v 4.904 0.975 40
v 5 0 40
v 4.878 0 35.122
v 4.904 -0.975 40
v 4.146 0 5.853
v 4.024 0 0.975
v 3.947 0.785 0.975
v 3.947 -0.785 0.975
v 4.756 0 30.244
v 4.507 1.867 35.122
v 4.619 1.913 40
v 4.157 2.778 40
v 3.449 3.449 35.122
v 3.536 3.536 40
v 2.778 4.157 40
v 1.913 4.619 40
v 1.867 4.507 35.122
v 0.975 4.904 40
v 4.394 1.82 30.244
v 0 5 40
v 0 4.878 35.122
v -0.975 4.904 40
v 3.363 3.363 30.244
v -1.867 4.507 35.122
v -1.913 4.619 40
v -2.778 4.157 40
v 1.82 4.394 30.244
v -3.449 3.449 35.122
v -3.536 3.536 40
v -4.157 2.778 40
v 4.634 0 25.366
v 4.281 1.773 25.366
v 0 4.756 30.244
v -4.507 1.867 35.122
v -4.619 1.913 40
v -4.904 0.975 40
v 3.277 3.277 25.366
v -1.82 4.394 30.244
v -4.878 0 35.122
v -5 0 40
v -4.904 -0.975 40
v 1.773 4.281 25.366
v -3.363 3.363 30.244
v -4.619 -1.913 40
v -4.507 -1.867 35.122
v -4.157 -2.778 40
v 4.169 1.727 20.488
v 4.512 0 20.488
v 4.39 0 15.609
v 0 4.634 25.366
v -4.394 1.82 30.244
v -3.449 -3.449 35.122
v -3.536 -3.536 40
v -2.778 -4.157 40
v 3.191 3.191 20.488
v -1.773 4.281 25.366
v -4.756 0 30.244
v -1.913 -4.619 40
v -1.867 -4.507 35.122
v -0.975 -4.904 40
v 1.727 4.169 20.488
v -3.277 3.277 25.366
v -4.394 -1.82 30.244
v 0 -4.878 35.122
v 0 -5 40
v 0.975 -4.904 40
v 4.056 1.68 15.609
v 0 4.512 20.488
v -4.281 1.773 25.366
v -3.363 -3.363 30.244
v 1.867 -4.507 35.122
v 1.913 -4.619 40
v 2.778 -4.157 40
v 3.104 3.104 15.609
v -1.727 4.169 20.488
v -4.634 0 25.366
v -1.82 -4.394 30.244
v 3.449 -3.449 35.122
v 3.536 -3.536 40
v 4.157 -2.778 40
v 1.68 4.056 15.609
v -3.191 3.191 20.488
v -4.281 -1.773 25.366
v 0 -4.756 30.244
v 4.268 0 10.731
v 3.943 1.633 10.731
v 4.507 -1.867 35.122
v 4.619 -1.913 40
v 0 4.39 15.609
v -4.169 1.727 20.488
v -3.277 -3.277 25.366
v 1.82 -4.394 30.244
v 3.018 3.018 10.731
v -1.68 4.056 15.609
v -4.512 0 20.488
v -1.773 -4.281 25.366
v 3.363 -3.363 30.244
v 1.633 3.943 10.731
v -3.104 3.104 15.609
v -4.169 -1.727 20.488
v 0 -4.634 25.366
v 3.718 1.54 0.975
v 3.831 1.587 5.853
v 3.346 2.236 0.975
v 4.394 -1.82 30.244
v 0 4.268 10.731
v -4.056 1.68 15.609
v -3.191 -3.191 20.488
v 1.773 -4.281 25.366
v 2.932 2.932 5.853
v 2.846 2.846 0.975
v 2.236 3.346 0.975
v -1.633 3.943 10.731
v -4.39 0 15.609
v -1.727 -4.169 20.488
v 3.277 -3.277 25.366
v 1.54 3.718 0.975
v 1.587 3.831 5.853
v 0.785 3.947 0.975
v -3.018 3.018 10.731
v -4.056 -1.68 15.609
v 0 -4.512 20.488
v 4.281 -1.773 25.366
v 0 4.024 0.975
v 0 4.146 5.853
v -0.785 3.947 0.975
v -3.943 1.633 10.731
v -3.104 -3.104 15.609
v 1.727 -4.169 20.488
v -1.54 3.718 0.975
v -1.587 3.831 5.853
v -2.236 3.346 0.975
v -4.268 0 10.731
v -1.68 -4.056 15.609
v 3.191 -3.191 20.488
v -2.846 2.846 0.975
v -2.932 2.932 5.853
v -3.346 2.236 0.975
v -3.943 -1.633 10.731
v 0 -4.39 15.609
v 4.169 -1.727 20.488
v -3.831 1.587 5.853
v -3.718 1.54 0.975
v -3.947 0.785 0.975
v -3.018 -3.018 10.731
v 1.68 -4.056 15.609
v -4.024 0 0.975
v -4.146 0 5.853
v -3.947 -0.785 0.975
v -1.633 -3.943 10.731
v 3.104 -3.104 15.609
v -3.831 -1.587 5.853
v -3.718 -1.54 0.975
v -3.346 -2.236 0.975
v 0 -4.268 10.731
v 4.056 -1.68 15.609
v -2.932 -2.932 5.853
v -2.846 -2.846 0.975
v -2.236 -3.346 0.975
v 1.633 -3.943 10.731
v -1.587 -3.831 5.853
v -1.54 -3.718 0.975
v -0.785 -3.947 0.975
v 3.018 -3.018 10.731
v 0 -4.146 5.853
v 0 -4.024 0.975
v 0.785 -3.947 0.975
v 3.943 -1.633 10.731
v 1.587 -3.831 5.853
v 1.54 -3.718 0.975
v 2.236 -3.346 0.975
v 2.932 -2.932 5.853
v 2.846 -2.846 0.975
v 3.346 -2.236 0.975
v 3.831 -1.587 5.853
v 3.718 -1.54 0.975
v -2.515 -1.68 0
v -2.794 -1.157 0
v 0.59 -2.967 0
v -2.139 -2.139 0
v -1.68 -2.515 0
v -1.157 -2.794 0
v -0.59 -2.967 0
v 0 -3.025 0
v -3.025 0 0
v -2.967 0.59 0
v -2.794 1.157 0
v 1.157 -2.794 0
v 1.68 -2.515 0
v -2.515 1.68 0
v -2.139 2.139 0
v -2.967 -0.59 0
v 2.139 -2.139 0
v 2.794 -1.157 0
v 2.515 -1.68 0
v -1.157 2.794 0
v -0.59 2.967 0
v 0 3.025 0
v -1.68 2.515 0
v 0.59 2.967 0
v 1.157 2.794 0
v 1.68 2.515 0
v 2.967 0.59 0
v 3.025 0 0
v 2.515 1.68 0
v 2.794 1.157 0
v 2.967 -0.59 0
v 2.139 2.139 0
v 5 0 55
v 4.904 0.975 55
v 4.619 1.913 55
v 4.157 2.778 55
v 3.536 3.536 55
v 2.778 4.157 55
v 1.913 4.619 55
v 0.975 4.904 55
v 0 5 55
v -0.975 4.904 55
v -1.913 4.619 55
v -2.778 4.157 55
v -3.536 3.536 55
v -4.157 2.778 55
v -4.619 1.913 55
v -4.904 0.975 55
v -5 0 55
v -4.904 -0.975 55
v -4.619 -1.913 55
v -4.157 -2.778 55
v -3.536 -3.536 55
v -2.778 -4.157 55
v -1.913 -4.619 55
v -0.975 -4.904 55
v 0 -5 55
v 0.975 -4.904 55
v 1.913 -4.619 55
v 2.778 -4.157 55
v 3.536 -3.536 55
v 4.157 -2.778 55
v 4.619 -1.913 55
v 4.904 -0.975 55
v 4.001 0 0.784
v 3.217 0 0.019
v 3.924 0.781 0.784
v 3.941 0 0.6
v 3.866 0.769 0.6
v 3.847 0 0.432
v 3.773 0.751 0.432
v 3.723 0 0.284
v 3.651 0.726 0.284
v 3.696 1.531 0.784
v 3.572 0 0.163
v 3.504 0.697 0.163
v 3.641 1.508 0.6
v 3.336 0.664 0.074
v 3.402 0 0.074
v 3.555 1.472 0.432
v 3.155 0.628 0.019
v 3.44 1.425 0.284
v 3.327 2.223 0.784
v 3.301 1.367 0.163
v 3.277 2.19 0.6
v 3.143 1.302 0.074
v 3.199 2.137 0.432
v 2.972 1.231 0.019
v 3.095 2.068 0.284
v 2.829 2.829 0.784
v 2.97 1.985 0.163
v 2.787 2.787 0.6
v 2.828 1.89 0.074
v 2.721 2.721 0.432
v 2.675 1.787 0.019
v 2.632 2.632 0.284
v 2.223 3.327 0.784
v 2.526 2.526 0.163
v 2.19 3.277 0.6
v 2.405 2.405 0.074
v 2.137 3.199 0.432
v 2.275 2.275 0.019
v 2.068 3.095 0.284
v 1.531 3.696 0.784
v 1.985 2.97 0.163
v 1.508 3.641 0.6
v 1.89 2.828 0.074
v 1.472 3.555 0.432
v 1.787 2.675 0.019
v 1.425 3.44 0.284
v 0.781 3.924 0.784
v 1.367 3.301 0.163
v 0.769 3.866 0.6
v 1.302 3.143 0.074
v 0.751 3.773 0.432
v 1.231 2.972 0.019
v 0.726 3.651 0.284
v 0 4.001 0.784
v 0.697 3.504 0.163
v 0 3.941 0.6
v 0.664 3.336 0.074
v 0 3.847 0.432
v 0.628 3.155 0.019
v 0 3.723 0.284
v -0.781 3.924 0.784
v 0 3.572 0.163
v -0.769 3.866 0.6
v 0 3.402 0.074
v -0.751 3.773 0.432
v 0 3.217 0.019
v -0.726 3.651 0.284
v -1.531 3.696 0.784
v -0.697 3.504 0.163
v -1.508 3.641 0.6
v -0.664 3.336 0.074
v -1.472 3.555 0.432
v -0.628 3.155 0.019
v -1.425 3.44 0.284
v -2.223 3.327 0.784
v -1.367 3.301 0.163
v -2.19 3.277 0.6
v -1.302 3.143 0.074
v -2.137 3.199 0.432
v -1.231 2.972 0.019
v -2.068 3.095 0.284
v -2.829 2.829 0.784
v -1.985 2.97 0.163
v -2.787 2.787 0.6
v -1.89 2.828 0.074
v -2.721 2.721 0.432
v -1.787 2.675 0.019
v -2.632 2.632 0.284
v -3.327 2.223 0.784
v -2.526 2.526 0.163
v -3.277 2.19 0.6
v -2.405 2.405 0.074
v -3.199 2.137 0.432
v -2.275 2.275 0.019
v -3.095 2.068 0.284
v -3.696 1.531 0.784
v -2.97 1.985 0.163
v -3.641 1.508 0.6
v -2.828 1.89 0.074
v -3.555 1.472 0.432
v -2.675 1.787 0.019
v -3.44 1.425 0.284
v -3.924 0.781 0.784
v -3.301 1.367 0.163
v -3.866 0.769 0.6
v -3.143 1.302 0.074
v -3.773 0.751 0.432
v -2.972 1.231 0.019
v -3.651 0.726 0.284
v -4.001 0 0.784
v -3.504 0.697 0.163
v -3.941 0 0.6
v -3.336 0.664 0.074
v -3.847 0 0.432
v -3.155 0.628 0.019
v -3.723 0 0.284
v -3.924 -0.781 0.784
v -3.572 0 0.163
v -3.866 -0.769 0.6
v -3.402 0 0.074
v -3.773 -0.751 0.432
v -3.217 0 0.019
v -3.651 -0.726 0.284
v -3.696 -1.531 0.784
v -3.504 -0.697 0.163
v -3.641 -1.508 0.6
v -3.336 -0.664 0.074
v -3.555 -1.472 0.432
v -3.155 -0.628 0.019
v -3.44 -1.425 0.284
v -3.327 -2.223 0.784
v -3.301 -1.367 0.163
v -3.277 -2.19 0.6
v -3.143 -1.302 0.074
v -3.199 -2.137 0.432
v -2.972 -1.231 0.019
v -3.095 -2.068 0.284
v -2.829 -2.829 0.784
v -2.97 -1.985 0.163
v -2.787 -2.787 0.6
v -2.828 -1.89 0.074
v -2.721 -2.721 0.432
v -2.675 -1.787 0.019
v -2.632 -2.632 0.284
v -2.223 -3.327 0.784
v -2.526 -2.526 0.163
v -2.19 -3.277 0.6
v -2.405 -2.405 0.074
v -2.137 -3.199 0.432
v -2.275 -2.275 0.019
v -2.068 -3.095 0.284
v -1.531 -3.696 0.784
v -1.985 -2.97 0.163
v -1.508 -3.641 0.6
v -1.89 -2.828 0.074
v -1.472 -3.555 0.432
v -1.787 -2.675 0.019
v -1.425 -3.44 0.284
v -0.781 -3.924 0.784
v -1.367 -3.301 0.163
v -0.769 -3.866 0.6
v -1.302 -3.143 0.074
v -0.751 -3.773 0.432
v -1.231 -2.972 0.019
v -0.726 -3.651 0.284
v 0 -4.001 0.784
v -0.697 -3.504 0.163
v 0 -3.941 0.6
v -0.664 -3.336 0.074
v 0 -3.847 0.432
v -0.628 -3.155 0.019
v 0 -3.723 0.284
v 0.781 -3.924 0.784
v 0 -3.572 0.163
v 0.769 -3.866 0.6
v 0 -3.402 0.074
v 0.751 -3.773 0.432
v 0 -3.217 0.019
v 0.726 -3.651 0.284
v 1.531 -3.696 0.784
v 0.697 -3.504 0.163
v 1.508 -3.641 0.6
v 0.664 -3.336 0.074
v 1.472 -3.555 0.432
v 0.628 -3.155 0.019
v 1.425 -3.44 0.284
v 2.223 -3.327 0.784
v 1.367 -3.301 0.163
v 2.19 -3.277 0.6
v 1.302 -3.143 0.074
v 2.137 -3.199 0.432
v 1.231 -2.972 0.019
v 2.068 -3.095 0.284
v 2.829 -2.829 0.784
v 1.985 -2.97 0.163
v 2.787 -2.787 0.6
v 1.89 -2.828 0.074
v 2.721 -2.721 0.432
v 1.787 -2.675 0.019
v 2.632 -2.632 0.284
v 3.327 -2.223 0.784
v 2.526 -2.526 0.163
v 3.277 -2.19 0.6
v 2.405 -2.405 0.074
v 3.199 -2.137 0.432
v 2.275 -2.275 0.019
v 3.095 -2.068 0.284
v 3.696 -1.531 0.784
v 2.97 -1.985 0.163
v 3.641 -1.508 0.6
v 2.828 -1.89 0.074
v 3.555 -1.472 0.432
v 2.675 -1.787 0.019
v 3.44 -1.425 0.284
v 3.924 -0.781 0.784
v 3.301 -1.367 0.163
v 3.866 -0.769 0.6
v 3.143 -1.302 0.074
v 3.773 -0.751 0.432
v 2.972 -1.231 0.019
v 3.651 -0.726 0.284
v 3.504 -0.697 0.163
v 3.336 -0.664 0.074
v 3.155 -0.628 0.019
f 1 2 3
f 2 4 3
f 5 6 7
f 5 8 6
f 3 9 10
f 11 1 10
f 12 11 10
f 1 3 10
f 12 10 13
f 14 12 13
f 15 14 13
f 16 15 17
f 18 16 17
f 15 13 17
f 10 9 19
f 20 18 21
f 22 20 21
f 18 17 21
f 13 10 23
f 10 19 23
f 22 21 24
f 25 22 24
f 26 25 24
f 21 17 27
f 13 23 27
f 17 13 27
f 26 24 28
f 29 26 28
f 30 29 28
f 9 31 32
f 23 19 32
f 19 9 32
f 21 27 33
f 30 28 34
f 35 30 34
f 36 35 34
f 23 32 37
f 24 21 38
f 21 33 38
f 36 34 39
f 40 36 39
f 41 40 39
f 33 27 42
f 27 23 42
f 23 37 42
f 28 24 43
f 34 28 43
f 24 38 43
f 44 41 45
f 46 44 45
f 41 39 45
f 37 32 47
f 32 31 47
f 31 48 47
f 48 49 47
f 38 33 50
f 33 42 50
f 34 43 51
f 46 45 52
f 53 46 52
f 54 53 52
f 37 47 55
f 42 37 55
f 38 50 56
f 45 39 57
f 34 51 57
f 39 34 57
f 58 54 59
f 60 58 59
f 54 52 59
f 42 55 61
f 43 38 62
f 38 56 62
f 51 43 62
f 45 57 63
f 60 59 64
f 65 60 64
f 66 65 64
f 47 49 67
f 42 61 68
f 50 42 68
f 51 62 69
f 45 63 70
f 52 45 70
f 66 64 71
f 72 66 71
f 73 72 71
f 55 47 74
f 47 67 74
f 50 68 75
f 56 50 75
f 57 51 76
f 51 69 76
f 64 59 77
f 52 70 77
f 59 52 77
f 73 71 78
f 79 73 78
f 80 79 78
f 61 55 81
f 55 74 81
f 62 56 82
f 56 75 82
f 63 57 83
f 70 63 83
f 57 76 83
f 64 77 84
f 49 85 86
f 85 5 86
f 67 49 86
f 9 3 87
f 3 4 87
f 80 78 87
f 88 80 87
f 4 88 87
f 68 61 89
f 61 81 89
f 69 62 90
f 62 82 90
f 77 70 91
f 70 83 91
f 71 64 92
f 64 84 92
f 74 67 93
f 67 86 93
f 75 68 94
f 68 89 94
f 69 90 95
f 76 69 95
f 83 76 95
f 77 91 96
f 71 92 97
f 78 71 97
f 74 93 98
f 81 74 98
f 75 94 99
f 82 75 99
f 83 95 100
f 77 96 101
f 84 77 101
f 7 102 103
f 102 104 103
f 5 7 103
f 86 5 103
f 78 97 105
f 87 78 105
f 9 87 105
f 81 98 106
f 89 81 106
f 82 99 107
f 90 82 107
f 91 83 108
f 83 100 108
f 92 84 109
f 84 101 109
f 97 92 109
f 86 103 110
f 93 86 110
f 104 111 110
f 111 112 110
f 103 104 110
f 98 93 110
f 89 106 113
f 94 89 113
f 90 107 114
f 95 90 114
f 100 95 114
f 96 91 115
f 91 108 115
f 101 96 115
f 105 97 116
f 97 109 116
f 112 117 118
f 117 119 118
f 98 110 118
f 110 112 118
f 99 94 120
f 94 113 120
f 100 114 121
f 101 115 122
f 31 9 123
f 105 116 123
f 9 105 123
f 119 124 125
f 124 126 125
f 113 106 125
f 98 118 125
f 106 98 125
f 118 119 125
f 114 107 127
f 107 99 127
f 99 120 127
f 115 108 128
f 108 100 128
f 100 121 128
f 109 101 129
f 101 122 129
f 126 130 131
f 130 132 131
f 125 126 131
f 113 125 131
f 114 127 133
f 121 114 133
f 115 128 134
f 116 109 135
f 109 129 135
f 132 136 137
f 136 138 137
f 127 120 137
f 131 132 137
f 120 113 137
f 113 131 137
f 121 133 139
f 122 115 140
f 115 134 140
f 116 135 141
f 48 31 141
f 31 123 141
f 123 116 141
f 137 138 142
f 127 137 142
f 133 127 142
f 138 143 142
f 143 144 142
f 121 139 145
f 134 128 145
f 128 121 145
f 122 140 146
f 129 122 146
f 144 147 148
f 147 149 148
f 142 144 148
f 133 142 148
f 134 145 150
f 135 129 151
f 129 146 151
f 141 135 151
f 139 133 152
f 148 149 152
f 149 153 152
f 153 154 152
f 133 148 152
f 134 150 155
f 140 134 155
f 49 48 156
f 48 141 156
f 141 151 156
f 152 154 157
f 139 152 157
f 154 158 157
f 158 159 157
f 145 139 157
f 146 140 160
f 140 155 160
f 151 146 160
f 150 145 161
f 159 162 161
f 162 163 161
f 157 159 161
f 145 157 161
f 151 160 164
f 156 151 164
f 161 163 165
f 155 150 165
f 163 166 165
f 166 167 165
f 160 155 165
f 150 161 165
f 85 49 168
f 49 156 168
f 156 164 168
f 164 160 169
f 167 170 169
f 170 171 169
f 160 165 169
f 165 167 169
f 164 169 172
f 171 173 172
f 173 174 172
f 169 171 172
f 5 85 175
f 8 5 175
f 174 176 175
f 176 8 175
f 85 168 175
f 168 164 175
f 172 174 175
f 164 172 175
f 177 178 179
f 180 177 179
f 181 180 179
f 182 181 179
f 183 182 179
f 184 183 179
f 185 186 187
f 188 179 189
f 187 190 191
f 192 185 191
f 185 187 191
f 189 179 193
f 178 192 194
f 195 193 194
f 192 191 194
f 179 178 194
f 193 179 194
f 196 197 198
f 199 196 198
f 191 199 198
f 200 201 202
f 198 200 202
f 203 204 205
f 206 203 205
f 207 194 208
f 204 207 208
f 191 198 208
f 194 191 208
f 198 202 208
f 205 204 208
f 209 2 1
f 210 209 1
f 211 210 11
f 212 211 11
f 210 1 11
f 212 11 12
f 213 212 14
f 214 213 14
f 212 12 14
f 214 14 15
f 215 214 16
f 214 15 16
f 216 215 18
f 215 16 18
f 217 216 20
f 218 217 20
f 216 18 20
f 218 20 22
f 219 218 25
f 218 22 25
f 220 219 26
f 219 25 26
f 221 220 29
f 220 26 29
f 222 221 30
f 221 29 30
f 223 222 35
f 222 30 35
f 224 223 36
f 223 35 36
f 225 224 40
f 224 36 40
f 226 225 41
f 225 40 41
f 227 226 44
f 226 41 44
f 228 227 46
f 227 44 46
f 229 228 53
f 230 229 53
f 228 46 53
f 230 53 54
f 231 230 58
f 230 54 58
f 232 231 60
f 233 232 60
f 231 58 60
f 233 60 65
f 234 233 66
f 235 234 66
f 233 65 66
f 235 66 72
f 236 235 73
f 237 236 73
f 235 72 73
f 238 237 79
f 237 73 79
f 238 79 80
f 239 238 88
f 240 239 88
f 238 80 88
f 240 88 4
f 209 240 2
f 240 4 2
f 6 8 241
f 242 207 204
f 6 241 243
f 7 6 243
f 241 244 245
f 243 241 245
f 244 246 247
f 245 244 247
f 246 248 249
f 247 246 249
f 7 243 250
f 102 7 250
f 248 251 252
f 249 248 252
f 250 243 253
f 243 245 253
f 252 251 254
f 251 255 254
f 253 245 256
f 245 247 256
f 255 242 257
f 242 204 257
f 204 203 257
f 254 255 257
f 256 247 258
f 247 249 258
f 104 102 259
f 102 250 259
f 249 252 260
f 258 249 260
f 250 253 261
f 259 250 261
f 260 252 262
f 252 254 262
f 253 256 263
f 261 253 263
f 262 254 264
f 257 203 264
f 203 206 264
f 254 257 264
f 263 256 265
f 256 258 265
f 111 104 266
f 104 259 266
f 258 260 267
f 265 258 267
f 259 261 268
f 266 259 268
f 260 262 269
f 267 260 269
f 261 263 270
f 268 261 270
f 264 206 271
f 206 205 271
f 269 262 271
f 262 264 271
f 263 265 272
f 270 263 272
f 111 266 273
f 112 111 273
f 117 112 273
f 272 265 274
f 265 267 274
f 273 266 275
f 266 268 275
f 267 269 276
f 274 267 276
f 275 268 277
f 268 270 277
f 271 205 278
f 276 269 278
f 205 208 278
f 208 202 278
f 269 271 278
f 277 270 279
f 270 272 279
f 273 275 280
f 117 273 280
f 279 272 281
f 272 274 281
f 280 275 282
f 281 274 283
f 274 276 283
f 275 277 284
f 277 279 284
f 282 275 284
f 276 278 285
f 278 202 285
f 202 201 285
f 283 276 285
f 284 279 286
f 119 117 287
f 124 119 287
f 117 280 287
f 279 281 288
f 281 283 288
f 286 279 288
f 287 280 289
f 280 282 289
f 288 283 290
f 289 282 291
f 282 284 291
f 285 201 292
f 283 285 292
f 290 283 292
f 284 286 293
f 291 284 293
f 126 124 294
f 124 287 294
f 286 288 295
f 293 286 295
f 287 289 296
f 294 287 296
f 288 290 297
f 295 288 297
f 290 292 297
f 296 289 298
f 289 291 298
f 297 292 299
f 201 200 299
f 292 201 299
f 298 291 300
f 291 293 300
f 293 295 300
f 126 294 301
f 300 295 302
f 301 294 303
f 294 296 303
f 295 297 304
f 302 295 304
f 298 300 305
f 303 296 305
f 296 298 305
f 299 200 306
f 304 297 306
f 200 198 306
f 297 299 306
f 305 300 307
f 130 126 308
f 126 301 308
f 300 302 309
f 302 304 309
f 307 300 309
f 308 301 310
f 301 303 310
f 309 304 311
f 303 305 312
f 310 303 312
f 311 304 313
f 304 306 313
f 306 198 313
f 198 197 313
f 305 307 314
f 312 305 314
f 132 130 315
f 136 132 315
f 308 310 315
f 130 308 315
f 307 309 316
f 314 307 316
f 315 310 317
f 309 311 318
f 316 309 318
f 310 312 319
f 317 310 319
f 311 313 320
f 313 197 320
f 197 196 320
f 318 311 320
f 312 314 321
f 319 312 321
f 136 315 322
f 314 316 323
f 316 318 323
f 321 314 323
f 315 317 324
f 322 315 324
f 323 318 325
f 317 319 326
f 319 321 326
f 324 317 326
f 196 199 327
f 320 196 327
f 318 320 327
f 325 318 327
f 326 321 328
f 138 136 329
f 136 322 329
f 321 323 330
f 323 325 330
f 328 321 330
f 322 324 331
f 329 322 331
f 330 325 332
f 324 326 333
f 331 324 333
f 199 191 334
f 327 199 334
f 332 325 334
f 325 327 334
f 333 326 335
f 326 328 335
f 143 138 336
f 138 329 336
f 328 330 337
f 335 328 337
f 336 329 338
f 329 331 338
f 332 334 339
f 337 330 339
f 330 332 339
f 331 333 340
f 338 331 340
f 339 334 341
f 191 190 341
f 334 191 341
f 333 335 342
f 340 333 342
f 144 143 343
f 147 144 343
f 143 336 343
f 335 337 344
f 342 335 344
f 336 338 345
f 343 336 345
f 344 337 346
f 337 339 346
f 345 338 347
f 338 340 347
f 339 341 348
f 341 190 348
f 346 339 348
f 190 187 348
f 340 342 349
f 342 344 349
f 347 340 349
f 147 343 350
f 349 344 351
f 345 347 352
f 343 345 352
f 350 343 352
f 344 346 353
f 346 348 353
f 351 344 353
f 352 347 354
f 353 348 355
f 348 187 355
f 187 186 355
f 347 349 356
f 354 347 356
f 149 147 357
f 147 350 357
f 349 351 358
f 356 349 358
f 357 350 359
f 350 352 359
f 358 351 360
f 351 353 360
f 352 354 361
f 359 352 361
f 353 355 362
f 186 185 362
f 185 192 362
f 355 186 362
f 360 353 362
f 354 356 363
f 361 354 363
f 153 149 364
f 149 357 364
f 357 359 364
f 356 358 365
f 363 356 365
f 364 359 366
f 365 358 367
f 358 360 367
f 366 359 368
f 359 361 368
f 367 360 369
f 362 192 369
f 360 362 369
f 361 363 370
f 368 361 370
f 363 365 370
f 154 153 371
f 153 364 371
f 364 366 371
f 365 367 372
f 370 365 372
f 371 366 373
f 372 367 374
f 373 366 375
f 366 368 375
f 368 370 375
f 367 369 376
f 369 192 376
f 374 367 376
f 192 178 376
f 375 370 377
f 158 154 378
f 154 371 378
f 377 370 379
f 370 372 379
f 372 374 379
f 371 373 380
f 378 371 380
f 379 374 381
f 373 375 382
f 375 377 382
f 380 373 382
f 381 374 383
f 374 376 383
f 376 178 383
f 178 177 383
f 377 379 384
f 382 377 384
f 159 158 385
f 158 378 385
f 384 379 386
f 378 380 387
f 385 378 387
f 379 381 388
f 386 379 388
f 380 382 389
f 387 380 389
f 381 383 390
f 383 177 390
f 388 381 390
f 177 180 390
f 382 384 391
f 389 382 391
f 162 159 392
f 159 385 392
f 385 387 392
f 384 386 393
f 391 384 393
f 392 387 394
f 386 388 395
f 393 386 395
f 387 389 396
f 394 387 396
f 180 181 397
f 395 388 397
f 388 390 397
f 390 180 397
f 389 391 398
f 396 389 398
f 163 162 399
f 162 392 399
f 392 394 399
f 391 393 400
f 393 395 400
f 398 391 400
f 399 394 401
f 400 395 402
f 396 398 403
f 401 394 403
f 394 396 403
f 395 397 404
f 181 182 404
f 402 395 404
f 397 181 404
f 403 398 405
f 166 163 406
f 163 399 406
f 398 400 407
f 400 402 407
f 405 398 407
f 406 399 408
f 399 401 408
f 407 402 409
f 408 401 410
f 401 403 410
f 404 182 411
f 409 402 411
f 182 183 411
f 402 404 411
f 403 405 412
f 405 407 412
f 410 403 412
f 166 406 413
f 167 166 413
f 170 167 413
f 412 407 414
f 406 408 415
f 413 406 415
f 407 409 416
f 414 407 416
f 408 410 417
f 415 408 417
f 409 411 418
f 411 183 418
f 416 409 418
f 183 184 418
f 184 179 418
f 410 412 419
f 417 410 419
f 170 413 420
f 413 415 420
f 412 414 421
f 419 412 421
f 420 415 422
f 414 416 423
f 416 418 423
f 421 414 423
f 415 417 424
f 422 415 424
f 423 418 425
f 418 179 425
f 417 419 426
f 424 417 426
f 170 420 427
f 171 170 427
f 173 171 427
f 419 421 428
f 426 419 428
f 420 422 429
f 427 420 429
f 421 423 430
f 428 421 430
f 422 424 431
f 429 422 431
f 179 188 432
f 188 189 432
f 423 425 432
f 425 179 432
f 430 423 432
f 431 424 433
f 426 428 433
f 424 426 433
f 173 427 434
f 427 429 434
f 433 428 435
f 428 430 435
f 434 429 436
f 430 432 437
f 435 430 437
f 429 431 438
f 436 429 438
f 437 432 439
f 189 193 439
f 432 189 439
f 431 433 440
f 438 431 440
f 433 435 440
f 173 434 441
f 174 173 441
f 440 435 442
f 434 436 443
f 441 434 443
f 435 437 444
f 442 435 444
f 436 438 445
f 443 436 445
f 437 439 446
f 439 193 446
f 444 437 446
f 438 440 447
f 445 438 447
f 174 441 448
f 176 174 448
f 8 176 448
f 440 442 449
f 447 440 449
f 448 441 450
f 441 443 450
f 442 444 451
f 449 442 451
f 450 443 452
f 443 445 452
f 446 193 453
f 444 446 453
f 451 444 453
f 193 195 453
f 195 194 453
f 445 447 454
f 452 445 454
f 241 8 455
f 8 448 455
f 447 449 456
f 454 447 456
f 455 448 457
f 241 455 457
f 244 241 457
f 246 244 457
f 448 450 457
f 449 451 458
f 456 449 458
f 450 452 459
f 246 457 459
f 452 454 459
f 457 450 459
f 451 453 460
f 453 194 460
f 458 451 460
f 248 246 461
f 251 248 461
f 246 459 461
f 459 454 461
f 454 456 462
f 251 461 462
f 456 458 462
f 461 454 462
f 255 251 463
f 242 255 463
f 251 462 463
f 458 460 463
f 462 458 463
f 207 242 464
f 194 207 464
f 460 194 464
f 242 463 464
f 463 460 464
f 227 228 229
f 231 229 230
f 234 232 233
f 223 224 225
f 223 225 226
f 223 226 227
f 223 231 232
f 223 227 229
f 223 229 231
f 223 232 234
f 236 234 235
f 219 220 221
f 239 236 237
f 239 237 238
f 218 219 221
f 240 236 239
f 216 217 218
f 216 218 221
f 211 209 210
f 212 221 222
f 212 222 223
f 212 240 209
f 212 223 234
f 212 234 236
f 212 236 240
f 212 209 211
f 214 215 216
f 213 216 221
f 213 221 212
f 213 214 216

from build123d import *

# Parameters (mm, degrees)
F2_R     = 5
F0_R     = 4
F4_R     = 1
F5_R     = 5
F6_DEPTH = 15


with BuildPart() as f3:
    # F2 (on offset) → F3 section 0
    with BuildSketch(Plane.XY.offset(40)):
        Circle(F2_R)
    # F0 (on Top) → F3 section 1
    with BuildSketch(Plane.XY):
        Circle(F0_R)
    loft()

    # F4
    f4_edges = [f3.edges().sort_by_distance(p)[0] for p in [
        (-4, 0, 0),
    ]]
    fillet(f4_edges, radius=F4_R)

    # F5 (on face) → F6 (join)
    with BuildSketch(Plane.XY.offset(40)):
        Circle(F5_R)
    extrude(amount=F6_DEPTH)


solid = f3.part
